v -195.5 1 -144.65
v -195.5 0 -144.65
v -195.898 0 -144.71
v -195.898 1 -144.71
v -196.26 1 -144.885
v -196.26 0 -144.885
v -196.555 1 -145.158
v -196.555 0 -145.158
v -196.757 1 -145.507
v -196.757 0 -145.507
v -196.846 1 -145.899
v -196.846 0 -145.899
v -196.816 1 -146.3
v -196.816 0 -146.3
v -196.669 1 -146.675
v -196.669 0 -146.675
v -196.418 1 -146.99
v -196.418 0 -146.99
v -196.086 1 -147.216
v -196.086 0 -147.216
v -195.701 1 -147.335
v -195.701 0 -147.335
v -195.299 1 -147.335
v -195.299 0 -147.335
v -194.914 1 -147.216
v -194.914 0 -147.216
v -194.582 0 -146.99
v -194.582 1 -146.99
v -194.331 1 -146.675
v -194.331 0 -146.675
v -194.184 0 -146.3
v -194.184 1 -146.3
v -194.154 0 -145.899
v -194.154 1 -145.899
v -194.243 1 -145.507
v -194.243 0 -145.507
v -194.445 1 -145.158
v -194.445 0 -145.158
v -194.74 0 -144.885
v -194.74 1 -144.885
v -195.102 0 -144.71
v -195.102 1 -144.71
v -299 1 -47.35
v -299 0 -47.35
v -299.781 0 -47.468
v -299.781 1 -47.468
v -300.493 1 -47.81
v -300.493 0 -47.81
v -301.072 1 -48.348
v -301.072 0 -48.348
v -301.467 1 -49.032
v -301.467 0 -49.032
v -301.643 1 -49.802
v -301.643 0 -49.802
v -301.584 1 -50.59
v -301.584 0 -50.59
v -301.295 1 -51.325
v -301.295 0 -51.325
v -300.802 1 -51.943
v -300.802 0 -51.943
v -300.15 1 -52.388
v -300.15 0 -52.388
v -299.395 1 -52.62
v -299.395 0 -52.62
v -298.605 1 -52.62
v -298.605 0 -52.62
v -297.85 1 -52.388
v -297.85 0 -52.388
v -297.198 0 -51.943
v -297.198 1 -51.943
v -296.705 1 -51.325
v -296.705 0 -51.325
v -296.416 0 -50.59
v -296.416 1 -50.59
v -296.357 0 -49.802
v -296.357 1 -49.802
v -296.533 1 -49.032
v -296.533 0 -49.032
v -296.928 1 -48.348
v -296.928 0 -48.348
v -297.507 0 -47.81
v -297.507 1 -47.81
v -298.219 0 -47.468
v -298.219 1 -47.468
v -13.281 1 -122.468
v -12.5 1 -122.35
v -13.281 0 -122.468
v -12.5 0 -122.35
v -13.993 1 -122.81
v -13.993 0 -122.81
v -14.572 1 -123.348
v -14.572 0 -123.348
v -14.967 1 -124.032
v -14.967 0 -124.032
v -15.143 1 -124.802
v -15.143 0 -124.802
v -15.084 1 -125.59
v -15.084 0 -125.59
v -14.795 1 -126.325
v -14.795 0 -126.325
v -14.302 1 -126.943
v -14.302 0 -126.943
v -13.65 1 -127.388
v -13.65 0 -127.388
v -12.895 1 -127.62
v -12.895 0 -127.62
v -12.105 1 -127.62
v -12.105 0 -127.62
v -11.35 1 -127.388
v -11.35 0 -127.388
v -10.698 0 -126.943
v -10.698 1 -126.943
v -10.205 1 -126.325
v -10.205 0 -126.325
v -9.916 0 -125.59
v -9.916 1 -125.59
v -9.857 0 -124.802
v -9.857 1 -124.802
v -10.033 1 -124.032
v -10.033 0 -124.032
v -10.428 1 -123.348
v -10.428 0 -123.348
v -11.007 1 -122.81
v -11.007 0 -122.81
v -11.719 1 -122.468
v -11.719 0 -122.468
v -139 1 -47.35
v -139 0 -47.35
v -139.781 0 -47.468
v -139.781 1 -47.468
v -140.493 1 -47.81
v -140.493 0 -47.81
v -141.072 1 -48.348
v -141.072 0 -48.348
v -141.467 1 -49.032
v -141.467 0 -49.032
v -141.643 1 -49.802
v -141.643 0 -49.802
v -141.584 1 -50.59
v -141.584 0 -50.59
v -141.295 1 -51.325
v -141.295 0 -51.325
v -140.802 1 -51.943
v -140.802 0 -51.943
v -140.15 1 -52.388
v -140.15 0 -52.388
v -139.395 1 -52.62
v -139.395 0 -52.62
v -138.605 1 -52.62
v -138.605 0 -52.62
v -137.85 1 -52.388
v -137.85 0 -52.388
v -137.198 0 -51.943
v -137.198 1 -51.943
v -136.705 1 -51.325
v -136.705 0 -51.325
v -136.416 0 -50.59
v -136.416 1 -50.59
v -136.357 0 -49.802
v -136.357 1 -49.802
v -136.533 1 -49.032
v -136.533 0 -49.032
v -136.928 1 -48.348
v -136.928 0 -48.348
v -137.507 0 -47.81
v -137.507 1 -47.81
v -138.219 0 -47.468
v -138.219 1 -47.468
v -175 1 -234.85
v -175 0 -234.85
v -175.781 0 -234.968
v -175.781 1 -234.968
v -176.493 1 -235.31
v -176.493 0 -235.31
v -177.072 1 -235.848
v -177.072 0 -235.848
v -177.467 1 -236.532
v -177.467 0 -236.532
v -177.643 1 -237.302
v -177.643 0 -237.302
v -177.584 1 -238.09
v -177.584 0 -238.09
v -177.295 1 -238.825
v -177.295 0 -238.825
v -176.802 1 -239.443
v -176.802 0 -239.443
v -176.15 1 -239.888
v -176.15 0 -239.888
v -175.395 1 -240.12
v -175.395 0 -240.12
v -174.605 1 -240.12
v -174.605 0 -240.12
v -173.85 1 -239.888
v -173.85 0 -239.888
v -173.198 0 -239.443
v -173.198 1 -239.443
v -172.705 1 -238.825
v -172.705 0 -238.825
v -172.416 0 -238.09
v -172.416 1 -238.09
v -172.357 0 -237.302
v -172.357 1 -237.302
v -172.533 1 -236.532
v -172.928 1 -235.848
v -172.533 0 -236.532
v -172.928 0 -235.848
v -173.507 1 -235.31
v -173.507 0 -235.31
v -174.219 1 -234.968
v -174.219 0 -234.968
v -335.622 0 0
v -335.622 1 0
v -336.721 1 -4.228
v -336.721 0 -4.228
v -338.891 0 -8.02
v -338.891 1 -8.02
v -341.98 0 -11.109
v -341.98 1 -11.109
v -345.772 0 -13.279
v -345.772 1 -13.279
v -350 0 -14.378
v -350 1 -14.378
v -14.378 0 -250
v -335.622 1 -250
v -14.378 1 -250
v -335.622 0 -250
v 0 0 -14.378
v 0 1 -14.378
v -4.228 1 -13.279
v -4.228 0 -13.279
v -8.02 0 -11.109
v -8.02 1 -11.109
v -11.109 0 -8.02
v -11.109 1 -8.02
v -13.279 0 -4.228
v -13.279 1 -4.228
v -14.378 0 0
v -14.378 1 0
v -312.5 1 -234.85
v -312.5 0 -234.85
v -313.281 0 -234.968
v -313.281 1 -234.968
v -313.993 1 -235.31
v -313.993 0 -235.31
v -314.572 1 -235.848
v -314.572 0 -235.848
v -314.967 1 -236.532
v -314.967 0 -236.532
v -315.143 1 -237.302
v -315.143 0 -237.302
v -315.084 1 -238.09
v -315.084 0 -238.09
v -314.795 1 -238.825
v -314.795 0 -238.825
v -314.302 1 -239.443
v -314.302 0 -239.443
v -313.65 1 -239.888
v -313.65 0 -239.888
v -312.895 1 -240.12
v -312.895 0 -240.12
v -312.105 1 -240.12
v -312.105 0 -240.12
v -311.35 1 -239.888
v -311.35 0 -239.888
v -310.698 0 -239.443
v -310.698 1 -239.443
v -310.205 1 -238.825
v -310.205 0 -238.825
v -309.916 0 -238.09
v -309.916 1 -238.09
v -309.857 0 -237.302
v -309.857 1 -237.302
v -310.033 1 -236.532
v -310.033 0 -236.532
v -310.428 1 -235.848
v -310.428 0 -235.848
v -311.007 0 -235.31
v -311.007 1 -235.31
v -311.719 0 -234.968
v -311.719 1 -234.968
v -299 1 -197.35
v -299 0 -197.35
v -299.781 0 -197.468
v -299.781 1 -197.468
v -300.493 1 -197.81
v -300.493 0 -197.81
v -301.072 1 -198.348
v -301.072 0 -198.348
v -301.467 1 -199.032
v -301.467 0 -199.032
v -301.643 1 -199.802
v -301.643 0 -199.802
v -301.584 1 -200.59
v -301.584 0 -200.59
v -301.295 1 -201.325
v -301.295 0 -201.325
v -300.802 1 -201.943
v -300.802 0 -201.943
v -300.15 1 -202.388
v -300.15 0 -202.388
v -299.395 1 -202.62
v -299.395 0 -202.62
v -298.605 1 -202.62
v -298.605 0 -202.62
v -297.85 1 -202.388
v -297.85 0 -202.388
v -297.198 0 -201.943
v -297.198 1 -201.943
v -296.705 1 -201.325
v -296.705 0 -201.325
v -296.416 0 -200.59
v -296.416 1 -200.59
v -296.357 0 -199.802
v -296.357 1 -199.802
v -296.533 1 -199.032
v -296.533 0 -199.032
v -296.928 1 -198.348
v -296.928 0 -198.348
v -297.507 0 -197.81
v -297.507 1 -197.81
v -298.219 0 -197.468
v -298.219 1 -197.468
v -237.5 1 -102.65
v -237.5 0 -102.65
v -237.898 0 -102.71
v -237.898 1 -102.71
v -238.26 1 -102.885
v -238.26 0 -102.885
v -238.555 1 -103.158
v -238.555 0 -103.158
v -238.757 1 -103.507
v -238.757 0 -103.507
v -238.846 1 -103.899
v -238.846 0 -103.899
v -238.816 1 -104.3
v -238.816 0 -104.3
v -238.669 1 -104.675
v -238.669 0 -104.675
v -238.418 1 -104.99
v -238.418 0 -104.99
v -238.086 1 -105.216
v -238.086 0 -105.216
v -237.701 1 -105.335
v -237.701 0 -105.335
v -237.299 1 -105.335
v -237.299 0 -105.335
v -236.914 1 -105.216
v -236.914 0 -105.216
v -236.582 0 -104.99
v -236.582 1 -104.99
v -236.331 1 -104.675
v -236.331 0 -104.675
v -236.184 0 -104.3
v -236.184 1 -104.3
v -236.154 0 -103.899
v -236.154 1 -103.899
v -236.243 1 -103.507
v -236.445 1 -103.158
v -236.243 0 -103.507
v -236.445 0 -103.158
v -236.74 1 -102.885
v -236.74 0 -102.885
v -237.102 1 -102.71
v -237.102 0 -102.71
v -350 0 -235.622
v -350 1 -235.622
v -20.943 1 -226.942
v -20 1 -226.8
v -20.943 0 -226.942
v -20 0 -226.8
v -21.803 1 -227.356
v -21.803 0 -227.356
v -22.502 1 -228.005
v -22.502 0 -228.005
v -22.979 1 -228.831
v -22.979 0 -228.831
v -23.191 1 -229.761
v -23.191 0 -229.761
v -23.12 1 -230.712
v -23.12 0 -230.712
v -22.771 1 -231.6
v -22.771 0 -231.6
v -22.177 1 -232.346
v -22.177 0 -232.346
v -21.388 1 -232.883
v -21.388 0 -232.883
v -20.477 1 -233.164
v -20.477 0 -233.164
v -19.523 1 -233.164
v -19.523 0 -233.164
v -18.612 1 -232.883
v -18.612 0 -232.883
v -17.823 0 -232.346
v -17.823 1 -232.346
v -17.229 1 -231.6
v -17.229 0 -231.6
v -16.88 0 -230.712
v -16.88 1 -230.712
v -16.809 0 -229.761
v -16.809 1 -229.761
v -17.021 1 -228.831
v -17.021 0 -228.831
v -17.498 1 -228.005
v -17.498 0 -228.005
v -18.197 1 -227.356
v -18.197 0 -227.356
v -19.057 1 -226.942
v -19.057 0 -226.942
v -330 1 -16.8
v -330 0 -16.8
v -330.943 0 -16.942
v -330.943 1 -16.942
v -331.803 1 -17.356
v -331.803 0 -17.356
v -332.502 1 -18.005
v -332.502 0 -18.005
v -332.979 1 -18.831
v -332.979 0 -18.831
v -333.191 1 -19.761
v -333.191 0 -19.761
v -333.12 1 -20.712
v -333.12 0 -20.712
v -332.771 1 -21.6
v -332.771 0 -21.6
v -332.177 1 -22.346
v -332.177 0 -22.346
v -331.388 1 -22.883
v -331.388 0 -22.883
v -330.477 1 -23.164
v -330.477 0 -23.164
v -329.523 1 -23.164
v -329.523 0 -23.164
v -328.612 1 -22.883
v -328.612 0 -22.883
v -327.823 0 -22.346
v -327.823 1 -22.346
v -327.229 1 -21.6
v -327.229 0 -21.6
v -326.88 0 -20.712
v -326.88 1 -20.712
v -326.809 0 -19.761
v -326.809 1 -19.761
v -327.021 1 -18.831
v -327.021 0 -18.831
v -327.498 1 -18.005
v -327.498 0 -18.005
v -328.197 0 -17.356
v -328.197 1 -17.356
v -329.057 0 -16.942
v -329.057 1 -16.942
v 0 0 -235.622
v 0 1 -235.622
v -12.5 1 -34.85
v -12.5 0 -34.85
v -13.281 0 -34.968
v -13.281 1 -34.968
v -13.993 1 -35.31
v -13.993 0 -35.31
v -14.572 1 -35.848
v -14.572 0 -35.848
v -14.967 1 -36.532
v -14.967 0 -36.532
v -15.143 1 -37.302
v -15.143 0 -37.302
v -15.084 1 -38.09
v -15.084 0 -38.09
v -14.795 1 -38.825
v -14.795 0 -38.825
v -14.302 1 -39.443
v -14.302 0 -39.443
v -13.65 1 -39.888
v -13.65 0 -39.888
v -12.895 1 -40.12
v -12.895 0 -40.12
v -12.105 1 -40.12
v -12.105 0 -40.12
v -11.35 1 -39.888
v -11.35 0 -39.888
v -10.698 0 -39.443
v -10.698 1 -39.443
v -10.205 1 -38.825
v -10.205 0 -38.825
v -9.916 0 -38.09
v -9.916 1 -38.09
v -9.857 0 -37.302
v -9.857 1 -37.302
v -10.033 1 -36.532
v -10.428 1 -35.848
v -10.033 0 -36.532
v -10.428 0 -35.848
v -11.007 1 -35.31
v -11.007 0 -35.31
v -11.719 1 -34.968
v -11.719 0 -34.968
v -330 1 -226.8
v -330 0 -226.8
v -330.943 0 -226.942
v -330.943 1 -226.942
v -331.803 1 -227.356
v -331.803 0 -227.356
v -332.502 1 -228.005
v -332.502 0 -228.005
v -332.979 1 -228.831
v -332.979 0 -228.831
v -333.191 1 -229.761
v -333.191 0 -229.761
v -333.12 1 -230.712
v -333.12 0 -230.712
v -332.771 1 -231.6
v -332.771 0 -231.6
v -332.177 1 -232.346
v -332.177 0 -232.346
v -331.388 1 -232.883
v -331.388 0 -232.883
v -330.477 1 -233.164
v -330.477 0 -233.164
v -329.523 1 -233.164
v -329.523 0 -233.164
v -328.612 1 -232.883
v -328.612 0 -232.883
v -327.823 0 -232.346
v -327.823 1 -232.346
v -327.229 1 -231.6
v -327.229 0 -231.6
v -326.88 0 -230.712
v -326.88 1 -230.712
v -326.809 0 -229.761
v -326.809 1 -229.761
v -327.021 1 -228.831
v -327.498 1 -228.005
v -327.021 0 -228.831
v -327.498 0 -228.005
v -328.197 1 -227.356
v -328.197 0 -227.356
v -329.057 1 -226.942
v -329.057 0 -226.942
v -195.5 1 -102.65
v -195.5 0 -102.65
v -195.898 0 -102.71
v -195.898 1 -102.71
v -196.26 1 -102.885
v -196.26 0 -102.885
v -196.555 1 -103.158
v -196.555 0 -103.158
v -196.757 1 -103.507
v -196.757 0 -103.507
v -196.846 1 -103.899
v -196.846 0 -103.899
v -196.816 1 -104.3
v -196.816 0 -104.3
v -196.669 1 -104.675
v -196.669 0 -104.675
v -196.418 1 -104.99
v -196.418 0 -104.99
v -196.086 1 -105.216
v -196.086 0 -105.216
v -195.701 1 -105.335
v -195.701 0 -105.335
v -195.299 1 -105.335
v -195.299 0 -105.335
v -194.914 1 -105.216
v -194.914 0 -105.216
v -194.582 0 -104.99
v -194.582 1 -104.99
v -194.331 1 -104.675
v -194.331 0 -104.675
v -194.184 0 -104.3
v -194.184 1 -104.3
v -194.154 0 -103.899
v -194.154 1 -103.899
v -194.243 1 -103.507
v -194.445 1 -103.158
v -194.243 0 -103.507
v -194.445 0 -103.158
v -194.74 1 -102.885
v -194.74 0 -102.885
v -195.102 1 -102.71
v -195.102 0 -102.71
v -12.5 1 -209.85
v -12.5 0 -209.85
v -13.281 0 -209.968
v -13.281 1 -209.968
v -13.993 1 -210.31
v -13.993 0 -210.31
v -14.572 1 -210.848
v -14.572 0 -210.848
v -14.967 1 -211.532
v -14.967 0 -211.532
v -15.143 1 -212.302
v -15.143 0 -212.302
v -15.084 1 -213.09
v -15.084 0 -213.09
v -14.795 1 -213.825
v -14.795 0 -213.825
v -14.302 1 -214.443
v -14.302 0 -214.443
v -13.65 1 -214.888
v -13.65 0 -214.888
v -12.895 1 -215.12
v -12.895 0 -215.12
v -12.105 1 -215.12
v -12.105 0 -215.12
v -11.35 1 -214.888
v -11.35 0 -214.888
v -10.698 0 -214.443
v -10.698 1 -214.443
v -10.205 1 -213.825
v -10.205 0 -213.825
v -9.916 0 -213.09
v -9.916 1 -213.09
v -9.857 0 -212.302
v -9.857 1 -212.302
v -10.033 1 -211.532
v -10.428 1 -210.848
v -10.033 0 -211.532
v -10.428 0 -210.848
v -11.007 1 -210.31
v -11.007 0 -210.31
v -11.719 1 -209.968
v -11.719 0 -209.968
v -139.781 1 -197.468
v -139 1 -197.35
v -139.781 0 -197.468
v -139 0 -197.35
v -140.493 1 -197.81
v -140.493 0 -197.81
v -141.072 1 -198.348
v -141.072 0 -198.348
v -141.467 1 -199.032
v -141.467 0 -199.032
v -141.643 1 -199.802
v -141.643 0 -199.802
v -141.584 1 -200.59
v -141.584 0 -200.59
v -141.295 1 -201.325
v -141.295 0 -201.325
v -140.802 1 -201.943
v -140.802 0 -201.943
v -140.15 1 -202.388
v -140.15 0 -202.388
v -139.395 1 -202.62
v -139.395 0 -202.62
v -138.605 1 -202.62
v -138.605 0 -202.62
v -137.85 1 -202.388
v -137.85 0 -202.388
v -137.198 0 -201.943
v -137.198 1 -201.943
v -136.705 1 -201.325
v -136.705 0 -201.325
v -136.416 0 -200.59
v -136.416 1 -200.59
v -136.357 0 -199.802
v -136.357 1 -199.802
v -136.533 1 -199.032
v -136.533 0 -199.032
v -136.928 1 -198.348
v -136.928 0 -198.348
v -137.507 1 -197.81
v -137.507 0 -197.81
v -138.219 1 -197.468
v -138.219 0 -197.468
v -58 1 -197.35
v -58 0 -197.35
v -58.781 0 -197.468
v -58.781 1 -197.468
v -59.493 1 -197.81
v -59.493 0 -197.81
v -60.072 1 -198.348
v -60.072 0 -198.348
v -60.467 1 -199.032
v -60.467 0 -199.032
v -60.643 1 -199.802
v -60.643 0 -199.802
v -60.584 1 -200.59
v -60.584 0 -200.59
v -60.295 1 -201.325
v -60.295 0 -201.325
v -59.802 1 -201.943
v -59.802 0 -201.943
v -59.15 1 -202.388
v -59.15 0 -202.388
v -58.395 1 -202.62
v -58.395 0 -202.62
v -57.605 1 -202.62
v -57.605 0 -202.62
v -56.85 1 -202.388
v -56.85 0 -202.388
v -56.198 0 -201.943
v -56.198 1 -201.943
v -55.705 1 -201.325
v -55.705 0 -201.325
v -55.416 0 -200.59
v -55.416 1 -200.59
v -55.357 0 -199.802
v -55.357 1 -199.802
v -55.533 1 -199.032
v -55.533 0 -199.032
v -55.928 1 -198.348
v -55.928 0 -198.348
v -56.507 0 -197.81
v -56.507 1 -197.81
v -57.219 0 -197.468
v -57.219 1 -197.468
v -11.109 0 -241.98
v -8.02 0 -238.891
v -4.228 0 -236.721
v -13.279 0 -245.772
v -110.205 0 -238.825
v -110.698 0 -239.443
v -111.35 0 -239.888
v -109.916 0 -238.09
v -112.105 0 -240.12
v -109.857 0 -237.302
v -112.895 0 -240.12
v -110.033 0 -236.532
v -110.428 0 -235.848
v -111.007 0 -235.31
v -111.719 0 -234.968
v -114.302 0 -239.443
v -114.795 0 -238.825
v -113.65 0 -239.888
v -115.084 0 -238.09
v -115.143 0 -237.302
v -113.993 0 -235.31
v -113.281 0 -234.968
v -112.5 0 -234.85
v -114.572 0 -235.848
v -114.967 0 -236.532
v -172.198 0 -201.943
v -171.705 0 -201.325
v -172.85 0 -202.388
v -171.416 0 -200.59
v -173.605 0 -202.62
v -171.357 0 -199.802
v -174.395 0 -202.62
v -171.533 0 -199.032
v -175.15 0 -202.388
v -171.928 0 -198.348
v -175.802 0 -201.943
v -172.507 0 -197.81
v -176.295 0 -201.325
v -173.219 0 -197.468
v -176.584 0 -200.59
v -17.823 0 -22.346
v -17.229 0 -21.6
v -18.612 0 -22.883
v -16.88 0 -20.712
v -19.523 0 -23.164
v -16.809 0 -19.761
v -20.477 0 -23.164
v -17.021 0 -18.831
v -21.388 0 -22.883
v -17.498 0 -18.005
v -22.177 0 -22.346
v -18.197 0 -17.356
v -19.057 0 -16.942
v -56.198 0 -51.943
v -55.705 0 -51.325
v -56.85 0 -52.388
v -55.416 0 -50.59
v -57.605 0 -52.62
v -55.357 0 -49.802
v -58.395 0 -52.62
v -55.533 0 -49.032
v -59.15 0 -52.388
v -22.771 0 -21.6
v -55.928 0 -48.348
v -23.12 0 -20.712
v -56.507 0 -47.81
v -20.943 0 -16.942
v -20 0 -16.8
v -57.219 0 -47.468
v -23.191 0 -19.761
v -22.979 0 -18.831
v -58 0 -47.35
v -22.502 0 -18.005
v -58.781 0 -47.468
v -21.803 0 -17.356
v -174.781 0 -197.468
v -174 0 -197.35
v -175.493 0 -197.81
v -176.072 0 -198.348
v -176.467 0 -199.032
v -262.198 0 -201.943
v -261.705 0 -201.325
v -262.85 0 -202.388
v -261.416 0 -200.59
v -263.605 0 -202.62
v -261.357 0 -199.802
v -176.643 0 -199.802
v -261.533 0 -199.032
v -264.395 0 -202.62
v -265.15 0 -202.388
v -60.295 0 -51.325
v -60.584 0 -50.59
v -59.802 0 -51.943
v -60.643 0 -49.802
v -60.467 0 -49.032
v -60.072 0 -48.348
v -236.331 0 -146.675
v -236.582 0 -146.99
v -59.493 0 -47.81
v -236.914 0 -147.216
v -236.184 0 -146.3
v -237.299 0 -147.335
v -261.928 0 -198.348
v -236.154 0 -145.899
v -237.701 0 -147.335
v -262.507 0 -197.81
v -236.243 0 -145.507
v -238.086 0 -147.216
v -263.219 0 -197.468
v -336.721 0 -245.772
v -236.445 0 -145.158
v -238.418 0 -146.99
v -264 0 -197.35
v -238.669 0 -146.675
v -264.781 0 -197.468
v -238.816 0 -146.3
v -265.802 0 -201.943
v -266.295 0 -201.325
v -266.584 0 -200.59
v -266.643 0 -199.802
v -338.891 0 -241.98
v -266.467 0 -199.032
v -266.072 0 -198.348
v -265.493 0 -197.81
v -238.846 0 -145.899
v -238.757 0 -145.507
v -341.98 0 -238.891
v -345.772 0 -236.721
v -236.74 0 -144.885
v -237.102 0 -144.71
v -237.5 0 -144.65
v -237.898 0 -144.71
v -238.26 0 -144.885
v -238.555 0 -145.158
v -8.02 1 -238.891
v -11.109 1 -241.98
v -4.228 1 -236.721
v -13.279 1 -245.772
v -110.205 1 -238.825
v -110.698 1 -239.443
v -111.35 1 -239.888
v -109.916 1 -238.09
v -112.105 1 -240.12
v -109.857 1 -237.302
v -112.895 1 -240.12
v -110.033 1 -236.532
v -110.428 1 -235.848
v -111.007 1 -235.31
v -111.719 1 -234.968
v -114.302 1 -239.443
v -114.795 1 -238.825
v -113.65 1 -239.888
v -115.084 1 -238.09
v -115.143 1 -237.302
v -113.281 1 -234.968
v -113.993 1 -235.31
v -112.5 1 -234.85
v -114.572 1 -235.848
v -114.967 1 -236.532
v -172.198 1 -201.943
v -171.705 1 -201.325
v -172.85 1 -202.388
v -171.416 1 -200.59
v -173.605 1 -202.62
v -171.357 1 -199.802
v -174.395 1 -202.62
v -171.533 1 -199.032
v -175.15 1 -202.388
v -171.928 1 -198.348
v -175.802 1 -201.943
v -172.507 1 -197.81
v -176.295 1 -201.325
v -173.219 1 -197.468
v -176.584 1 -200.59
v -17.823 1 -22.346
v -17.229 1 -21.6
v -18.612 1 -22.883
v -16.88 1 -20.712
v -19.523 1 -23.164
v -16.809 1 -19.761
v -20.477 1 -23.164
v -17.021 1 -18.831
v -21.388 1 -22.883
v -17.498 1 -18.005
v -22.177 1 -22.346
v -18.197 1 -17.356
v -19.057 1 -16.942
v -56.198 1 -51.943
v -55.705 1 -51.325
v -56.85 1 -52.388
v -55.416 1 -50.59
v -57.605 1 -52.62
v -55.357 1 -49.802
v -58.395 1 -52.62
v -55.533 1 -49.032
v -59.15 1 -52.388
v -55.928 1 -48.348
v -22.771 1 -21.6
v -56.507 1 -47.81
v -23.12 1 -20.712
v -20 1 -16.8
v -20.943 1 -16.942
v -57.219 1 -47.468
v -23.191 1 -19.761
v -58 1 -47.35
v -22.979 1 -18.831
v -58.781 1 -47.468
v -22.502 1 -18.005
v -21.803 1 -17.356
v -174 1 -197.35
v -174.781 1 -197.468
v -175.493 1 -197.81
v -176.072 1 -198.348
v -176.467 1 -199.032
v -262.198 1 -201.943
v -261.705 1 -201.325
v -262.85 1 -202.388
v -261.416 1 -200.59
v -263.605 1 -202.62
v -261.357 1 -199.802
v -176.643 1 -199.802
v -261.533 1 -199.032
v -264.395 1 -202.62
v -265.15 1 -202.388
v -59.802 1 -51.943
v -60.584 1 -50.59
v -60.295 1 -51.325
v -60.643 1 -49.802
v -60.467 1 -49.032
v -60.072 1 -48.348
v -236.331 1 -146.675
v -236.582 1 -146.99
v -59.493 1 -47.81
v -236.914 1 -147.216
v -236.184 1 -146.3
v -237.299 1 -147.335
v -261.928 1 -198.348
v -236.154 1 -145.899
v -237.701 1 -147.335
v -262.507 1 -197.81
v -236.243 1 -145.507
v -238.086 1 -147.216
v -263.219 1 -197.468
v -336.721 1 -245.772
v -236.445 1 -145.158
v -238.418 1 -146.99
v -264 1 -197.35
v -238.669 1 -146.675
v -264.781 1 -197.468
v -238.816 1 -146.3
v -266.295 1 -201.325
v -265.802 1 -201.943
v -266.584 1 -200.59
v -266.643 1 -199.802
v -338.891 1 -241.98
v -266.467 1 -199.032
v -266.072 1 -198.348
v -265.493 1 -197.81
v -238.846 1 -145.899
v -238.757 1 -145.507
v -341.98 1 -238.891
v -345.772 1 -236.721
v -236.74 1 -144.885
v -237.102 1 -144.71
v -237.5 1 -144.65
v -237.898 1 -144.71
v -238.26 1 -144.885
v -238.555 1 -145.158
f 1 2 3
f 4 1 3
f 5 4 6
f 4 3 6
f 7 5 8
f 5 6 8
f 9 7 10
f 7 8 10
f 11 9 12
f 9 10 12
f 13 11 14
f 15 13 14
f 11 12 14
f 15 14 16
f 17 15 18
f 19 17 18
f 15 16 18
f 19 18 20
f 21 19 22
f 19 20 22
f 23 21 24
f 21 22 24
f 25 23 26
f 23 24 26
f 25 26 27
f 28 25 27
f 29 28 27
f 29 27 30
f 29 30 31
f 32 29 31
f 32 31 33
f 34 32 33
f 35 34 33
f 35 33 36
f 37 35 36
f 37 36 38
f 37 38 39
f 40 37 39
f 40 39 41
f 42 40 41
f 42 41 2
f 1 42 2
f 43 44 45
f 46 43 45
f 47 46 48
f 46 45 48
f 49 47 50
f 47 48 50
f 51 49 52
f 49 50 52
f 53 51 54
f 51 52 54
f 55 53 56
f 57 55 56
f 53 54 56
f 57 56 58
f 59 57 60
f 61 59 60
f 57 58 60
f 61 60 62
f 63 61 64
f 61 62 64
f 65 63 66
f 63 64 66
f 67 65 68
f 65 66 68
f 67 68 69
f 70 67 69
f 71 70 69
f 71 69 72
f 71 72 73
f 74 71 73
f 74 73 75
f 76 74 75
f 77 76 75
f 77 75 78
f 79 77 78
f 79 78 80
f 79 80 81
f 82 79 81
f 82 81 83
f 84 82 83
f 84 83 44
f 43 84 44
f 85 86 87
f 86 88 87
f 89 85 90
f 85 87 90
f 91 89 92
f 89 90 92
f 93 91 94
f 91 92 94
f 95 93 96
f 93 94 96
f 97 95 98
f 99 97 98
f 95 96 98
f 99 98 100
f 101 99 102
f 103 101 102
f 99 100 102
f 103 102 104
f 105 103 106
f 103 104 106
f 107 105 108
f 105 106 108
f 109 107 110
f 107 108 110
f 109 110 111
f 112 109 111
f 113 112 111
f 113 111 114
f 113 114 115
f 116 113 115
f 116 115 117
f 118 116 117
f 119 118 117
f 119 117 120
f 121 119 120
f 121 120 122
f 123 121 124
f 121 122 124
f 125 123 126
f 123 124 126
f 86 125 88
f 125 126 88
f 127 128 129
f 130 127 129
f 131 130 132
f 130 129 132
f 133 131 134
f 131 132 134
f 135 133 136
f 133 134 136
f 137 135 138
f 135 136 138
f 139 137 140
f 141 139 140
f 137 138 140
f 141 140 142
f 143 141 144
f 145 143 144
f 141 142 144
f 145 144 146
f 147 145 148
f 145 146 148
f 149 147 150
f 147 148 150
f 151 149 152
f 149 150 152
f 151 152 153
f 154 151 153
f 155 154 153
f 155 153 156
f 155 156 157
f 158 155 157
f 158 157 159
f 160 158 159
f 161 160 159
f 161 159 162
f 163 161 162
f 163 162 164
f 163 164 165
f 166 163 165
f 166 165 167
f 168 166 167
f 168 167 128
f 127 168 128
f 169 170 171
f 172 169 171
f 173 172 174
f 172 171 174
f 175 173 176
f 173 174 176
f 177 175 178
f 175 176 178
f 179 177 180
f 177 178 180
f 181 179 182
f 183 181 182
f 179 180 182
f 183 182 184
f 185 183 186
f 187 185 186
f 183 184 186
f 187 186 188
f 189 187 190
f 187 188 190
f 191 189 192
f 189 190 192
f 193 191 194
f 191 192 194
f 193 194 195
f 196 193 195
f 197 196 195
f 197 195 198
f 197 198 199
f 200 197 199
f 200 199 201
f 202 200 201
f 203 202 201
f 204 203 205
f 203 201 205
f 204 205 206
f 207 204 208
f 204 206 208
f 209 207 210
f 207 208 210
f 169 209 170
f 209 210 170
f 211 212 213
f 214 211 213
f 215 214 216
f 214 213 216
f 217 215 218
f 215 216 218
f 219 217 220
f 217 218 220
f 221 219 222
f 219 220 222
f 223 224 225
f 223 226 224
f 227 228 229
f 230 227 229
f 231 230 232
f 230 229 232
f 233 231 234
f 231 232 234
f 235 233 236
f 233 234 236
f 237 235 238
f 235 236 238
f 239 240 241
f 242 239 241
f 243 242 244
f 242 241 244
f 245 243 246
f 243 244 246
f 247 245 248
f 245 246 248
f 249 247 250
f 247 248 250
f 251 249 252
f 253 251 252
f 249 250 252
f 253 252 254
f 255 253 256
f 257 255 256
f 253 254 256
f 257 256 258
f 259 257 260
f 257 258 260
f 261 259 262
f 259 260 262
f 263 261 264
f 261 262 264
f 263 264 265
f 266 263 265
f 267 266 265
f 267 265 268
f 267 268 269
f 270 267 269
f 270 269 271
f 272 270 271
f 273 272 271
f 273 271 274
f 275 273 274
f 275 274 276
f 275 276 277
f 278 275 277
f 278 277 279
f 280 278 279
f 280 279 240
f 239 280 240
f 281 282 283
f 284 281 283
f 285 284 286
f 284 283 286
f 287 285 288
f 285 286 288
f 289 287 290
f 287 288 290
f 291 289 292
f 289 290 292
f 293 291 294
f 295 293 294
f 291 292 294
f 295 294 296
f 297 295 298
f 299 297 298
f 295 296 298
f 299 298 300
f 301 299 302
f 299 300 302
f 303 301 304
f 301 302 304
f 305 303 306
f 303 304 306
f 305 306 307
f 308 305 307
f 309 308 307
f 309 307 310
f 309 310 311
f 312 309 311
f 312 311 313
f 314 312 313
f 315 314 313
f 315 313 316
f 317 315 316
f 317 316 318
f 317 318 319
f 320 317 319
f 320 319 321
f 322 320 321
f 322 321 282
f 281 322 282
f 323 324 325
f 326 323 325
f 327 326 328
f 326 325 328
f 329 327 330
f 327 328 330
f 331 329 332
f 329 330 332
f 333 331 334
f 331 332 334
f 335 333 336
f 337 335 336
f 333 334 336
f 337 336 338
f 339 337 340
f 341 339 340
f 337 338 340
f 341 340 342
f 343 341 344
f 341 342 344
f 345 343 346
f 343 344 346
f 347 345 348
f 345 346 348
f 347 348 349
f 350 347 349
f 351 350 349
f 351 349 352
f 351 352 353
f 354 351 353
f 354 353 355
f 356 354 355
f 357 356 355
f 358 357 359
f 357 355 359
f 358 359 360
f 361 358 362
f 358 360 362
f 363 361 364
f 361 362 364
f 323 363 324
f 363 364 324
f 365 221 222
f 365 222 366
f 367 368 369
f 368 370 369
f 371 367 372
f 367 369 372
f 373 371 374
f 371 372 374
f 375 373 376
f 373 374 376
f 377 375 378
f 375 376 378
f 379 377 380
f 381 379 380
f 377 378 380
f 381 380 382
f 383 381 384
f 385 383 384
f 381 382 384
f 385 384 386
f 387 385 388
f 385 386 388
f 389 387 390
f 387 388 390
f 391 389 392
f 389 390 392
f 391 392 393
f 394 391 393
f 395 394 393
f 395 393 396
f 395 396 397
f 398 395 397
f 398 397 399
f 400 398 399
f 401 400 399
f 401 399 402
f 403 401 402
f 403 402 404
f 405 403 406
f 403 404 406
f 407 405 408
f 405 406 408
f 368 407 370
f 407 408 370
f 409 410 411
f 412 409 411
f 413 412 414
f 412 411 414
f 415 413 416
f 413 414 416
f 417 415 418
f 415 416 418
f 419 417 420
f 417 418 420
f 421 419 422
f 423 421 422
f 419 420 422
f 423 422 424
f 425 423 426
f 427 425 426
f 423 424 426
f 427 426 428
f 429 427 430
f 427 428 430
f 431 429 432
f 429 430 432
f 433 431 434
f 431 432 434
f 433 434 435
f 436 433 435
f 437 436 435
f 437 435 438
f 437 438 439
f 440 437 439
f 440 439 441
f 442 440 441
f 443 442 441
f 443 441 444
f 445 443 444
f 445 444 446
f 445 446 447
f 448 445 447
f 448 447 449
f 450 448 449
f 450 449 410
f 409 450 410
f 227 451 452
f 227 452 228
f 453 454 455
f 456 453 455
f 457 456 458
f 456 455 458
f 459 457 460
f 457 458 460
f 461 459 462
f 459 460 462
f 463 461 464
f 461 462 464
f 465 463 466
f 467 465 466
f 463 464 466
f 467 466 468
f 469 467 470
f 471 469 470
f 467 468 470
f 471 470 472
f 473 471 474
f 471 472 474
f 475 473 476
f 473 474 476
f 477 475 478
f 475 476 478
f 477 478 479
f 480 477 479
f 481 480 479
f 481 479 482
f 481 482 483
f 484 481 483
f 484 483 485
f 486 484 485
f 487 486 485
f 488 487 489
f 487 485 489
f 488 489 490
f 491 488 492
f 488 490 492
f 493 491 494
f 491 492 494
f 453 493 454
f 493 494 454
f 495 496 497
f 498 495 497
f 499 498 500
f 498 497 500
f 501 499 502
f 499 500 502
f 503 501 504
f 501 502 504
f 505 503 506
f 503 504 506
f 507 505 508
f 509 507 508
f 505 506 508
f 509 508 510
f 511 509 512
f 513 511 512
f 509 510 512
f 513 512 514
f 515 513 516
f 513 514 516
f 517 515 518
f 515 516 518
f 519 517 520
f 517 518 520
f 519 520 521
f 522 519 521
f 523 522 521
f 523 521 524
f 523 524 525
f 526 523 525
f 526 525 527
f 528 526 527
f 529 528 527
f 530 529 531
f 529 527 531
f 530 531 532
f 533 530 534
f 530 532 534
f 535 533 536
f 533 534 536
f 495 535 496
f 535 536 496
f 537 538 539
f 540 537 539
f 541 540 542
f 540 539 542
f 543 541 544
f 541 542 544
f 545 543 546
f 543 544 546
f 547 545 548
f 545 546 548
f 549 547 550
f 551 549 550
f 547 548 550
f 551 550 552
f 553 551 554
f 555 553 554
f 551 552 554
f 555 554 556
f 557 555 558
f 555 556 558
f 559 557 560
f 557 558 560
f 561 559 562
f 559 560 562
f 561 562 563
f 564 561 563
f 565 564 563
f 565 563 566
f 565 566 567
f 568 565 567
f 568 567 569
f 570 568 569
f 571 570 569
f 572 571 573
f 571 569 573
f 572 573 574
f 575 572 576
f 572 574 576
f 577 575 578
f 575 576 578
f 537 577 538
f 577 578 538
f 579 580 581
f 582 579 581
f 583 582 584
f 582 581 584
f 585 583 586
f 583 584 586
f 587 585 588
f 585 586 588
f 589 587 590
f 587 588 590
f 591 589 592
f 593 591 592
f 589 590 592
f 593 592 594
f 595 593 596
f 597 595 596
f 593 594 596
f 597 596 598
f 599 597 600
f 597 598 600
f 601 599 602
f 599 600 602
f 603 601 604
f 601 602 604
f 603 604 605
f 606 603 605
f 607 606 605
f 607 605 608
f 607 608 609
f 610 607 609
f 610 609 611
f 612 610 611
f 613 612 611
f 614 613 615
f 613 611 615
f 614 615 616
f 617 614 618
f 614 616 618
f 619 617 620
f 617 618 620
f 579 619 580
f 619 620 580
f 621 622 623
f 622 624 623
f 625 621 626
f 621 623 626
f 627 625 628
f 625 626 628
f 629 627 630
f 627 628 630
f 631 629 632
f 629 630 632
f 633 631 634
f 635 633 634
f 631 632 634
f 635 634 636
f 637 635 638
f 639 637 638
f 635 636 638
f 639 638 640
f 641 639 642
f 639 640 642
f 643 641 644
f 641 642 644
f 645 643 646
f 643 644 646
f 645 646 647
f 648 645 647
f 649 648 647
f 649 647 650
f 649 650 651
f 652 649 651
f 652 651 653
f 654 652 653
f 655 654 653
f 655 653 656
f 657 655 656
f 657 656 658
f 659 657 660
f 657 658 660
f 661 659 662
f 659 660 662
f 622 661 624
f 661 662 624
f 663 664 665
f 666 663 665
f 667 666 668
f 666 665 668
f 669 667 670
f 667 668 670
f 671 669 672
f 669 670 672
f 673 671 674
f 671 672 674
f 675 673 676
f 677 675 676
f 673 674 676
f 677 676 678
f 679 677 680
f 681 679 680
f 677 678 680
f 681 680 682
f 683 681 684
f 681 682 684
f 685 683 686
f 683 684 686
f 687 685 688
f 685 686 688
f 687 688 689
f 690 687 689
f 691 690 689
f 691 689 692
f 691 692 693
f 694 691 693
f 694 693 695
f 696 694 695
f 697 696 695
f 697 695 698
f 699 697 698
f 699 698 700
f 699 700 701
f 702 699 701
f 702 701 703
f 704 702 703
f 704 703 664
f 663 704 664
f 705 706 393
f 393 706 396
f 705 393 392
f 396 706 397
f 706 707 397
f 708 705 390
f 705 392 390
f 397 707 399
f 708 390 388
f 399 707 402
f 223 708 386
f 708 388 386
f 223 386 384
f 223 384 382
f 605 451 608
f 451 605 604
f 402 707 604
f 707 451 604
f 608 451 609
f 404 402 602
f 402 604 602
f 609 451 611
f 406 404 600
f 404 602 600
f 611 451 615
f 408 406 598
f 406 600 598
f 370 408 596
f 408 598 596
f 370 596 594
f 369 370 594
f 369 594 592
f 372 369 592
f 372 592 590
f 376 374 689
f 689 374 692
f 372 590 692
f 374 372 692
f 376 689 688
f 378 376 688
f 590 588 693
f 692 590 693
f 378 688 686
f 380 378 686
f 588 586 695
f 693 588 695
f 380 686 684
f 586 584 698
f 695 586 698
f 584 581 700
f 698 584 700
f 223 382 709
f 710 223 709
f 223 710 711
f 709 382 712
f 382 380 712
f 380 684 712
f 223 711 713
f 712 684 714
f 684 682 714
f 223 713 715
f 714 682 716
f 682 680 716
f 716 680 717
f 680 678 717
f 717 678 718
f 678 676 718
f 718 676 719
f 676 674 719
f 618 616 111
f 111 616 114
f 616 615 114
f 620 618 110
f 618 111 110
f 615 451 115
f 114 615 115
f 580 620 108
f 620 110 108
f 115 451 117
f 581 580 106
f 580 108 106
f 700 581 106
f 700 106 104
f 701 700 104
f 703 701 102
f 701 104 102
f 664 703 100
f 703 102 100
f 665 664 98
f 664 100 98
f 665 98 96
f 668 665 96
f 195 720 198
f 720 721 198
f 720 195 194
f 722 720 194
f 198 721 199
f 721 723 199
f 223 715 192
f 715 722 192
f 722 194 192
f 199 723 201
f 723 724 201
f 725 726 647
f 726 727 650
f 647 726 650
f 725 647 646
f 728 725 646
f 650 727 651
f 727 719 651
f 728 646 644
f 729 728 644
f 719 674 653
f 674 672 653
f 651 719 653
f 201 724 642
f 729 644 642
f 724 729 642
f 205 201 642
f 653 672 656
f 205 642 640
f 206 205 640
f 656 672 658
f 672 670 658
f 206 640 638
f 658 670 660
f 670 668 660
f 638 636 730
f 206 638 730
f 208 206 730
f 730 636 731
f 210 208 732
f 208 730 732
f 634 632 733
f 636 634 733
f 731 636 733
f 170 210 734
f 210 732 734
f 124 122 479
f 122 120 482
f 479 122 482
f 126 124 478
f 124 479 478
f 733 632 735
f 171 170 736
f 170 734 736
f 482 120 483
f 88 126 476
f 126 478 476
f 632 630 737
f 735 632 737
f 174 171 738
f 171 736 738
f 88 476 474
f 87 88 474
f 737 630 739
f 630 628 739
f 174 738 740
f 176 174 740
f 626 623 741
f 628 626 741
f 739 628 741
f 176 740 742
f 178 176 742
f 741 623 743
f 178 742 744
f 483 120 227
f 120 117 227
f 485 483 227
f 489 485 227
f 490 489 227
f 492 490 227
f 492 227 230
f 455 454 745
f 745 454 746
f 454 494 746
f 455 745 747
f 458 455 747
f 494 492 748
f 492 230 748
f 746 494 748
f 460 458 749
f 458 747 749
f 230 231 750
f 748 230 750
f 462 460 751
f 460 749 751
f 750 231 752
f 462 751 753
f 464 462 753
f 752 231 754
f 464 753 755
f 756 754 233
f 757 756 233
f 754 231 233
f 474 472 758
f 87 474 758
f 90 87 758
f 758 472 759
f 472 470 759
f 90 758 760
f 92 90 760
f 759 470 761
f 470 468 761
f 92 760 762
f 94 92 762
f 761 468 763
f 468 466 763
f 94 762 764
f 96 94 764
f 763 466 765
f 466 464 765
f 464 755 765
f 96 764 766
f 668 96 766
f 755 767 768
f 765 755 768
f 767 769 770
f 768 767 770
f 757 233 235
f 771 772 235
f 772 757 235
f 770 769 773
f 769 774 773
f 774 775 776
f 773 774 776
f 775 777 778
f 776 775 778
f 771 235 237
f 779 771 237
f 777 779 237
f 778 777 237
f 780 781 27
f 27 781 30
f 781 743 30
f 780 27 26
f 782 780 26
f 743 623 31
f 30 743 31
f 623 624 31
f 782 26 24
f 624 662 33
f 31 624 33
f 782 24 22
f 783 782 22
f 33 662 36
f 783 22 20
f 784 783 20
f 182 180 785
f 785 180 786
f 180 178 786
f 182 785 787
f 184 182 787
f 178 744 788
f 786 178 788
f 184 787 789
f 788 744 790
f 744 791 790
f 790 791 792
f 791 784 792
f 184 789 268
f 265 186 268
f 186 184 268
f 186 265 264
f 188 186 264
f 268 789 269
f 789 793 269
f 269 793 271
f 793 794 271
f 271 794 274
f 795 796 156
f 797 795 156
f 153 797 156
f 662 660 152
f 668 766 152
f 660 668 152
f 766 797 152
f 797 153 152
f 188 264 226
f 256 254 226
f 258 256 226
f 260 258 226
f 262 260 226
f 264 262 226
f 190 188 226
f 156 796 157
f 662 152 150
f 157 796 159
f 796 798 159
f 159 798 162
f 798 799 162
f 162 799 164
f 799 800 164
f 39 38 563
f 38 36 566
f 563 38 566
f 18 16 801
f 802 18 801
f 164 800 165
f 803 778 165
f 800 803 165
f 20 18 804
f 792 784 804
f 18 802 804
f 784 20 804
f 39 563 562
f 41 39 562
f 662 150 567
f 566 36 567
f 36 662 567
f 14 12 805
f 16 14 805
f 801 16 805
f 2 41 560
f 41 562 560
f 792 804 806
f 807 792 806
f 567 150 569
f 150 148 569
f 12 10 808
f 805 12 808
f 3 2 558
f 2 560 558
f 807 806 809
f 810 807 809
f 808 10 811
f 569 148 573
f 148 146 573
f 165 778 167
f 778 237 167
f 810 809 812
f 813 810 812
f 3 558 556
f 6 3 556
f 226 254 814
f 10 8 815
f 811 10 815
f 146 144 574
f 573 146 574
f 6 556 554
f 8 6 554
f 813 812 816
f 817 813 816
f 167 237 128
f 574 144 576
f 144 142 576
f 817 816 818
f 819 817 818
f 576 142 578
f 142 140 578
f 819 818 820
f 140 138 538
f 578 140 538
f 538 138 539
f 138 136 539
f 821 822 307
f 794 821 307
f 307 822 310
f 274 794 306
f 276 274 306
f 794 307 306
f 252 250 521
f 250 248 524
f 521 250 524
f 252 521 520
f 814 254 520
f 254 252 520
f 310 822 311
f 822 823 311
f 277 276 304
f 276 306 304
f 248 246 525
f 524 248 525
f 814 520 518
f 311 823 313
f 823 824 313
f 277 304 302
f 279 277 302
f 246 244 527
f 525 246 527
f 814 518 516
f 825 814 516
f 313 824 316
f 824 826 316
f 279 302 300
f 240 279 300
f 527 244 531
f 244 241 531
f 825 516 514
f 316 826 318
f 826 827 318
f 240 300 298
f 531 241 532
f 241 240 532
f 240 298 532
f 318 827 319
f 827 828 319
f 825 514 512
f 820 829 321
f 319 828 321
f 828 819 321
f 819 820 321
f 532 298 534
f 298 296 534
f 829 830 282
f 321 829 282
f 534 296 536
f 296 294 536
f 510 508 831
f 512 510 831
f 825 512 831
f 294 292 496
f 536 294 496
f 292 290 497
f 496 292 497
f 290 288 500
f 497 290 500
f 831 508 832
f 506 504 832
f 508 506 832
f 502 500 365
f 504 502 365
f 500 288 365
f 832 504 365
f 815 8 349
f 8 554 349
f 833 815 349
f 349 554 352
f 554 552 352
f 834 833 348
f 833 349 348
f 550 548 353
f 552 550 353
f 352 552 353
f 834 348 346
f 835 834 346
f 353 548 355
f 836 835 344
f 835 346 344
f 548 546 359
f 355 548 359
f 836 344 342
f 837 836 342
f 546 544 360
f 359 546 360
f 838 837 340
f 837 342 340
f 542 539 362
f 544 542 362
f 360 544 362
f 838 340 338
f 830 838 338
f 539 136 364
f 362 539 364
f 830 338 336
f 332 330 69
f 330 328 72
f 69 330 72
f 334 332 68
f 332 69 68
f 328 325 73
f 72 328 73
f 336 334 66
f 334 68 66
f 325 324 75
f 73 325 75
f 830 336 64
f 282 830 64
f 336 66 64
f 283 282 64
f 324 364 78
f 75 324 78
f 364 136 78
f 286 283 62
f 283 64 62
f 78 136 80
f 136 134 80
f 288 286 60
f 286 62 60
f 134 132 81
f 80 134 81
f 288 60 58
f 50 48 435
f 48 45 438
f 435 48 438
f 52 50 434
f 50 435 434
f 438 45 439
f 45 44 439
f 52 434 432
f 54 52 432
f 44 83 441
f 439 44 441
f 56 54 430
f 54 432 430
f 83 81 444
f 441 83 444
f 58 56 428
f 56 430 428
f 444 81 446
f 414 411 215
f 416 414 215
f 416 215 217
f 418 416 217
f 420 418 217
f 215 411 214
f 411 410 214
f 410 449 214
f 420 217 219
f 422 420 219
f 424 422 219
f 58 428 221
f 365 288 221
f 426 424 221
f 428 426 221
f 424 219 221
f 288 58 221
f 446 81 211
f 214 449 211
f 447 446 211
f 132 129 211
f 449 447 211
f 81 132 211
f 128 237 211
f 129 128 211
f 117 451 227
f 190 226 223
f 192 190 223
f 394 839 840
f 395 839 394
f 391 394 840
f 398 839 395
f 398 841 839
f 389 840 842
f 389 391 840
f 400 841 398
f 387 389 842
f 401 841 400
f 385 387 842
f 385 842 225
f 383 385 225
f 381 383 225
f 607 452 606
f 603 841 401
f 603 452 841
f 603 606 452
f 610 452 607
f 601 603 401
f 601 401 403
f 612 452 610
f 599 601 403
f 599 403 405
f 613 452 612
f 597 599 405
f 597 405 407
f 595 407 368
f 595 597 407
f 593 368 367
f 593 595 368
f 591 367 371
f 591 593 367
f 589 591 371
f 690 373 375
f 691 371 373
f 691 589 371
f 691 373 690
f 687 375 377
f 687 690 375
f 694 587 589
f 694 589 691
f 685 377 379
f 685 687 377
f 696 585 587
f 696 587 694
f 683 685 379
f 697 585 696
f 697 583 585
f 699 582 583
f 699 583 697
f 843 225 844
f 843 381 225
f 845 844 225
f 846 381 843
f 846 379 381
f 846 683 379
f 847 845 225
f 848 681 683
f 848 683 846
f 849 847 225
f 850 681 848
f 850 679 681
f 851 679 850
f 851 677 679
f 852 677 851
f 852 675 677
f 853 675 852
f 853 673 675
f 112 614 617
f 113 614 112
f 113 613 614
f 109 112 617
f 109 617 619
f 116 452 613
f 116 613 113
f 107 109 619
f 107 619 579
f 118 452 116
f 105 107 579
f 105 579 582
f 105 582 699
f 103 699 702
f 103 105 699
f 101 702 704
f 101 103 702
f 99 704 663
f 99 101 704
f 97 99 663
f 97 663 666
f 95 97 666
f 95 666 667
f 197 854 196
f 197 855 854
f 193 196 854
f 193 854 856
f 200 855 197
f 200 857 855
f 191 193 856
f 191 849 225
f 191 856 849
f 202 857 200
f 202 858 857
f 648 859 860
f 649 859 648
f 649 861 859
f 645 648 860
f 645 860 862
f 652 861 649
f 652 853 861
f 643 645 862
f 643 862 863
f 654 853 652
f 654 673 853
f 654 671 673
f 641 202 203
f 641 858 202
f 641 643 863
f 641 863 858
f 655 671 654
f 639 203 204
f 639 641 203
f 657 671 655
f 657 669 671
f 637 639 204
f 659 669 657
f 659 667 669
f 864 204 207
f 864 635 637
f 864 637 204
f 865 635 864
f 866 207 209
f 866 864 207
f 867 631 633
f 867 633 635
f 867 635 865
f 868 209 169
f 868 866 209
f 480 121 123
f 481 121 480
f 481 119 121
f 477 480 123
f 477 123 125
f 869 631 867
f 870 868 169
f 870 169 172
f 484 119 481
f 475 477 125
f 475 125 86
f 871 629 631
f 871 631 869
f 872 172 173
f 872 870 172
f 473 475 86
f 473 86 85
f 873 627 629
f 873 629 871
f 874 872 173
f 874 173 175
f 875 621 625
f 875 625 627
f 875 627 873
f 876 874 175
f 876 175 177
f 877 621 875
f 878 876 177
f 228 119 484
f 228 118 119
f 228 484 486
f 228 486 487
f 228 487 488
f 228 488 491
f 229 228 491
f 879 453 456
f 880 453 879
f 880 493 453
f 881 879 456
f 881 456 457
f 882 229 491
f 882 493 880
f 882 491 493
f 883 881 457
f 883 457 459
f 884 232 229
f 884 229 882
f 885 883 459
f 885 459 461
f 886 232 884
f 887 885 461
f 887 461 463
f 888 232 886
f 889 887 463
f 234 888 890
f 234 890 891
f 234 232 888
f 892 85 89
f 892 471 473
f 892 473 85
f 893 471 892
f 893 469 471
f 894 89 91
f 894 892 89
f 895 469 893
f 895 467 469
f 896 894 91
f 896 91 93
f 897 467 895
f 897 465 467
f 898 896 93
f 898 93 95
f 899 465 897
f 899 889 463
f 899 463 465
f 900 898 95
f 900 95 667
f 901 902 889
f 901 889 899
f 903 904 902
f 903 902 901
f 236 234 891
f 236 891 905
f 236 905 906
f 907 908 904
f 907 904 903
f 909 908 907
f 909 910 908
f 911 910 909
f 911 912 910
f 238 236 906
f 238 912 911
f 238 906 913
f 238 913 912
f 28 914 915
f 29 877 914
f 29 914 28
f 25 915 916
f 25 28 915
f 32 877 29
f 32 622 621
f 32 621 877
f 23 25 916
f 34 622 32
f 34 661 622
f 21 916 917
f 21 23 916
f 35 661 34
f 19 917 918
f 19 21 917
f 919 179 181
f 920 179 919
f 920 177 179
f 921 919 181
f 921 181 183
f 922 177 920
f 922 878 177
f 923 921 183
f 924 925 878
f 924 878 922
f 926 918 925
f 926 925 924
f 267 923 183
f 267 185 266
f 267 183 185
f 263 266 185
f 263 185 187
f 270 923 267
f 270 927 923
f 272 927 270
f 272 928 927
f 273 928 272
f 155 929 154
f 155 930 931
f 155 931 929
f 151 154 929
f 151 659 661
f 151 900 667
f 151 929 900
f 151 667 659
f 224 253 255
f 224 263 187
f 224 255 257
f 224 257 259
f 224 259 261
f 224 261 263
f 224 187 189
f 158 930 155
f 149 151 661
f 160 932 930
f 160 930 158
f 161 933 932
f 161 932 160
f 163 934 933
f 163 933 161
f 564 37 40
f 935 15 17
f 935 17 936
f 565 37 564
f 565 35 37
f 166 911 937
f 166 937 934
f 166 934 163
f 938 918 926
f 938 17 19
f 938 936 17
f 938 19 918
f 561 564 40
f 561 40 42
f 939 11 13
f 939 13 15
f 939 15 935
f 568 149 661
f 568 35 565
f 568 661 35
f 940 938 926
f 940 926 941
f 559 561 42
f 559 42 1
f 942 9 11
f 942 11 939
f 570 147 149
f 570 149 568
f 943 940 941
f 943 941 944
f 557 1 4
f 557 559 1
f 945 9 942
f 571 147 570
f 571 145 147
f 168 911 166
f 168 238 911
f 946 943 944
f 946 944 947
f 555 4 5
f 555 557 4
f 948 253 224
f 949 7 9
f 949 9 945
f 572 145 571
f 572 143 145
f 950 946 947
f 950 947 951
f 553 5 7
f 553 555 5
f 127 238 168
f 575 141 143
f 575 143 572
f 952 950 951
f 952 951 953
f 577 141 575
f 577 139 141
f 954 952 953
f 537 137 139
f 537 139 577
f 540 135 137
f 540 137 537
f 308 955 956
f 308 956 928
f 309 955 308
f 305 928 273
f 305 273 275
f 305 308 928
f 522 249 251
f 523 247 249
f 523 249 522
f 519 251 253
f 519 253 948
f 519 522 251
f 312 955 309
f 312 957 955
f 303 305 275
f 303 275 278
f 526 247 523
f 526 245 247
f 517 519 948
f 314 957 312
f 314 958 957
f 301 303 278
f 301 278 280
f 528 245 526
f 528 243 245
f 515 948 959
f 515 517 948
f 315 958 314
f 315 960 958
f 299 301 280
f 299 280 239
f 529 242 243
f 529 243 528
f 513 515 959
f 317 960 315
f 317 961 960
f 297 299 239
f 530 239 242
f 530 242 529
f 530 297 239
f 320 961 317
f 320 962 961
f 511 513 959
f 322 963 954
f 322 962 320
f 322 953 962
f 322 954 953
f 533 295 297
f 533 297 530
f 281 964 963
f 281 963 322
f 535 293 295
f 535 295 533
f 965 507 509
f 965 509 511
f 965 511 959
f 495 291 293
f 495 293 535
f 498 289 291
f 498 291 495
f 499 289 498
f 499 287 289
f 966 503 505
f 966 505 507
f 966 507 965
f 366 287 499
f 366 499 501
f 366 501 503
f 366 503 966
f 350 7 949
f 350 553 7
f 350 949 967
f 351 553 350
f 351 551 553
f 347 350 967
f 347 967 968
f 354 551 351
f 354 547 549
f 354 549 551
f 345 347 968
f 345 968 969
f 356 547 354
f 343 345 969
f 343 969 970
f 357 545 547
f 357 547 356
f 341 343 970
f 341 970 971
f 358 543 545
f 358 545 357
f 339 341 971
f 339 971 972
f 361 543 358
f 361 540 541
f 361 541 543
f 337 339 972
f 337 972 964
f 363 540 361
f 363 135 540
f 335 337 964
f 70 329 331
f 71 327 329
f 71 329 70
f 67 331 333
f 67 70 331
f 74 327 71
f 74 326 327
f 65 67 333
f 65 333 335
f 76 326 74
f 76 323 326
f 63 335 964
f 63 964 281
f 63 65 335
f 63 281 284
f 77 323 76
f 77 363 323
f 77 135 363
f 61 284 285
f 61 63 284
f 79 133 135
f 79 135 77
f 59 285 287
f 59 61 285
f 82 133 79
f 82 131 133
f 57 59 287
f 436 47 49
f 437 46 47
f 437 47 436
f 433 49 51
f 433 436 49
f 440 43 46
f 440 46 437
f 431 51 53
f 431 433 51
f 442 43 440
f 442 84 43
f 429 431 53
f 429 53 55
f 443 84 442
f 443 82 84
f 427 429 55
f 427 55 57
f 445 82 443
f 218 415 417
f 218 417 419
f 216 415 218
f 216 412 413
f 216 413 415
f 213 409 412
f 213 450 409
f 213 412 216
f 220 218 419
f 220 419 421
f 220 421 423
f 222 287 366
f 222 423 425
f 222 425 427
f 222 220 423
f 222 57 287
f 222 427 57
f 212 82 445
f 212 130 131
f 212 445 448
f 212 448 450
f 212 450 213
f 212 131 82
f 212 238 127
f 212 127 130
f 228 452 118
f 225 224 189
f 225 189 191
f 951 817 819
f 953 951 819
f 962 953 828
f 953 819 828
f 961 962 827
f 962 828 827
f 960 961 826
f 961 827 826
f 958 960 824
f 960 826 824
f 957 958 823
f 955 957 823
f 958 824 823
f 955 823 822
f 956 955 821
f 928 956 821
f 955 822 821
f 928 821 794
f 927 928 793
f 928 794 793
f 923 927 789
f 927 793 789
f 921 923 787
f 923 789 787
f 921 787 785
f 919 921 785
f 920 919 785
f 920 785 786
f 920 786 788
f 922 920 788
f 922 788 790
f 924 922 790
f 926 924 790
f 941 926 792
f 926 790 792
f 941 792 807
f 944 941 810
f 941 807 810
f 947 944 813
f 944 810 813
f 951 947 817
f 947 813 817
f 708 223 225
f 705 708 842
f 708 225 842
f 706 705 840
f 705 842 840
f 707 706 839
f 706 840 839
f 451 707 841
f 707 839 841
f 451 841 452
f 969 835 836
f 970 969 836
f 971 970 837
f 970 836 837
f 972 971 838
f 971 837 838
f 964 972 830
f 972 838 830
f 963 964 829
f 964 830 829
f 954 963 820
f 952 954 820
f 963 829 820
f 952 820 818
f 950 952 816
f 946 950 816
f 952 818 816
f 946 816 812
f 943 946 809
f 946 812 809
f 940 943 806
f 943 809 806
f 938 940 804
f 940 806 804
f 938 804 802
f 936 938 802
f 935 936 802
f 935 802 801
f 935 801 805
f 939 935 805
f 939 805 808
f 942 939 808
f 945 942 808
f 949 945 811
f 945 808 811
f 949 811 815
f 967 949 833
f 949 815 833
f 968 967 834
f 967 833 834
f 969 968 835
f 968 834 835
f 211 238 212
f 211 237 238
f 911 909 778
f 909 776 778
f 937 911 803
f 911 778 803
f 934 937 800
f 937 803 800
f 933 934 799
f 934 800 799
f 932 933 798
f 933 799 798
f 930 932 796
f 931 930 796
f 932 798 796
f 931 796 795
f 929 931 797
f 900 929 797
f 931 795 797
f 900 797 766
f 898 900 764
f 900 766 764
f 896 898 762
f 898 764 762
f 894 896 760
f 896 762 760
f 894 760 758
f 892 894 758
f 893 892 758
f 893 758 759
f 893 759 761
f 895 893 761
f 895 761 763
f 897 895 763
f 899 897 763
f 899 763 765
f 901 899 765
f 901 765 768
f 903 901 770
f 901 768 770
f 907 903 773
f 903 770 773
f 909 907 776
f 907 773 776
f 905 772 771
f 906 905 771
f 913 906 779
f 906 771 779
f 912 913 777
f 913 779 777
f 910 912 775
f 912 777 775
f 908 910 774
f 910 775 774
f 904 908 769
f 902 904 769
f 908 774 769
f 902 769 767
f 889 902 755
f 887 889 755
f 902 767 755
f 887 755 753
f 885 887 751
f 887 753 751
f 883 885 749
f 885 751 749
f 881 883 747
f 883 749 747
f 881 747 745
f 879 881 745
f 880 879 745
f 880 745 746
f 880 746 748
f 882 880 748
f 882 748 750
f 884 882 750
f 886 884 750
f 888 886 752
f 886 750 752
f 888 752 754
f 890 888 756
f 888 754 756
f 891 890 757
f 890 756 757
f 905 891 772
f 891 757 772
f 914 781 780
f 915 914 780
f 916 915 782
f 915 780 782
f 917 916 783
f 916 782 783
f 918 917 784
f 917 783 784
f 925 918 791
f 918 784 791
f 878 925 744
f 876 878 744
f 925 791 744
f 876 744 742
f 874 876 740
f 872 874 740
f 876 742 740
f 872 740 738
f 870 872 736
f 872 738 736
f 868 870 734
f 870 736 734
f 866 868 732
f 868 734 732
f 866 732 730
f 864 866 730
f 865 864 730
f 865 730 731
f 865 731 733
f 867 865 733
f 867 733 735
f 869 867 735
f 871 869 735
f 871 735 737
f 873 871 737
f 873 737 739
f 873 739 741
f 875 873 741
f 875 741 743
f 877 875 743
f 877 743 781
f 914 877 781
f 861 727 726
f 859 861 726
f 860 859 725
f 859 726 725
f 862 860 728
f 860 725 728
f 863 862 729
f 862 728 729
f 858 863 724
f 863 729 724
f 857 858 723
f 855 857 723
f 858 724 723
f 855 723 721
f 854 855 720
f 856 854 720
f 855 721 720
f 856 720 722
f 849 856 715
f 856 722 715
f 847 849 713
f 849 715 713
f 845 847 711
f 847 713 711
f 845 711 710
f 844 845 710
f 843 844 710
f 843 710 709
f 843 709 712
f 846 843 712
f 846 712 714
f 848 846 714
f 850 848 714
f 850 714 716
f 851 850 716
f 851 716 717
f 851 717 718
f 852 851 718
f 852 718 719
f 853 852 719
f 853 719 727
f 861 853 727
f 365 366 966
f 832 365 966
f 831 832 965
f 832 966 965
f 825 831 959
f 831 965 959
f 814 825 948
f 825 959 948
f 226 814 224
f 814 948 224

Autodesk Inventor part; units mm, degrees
ref_plane "YZ Plane" through (0, 0, 0) normal (1, 0, 0) x (0, 1, 0)
ref_plane "XZ Plane" through (0, 0, 0) normal (0, 1, 0) x (-1, 0, 0)
ref_plane "XY Plane" through (0, 0, 0) normal (0, 0, 1) x (1, 0, 0)
sketch "Sketch1" plane through (0, 0, 0) normal (0, 1, 0) x (-1, 0, 0)
  line L0 (0, 0) -> (350, 0)
  line L1 (350, 0) -> (350, -250)
  line L2 (350, -250) -> (0, -250)
  line L3 (0, -250) -> (0, 0)
  dimension "d0" = 250
  dimension "d1" = 350
extrude "Extrusion1" add sketch "Sketch1" along normal blind 1
sketch "Sketch2" plane through (0, 1, 0) normal (0, 1, 0) x (1, 0, 0)
  line L0 (-350, 0) -> (0, 0) projected
  line L1 (0, 0) -> (0, 250) projected
  line L2 (0, 250) -> (-350, 250) projected
  line L3 (-350, 250) -> (-350, 0) projected
  circle A0 centre (2, -2) radius 16.5
  circle A1 centre (-352, -2) radius 16.5
  circle A2 centre (-352, 252) radius 16.5
  circle A3 centre (2, 252) radius 16.5
  dimension "d9" = 2
  dimension "d10" = 2
  dimension "d11" = 33
  dimension "d12" = 2
  dimension "d13" = 2
  dimension "d14" = 33
  dimension "d15" = 2
  dimension "d16" = 2
  dimension "d17" = 33
  dimension "d18" = 2
  dimension "d19" = 2
  dimension "d20" = 33
extrude "Extrusion2" cut sketch "Sketch2" against normal blind 1 contours L3 A1 L0 | L0 A1 L3 | A0 L1 L0 | L0 L1 A0 | A2 L2 L3 | L3 L2 A2 | A3 L2 L1 | L1 L2 A3
sketch "Sketch3" plane through (0, 1, 0) normal (0, 1, 0) x (1, 0, 0)
  line L0 (-335.6217, 0) -> (-14.3783, 0) projected
  line L1 (0, 14.3783) -> (0, 235.6217) projected
  line L2 (-14.3783, 250) -> (-335.6217, 250) projected
  line L3 (-350, 235.6217) -> (-350, 14.3783) projected
  point P0 (0, 0)
  point P1 (-20, 20)
  point P2 (-20, 230)
  point P3 (-330, 230)
  point P4 (-330, 20)
  dimension "d23" = 20
  dimension "d24" = 20
  dimension "d25" = 20
  dimension "d26" = 20
  dimension "d27" = 20
  dimension "d28" = 20
  dimension "d29" = 20
  dimension "d30" = 20
hole "Hole1" at (-20, 1, -20) at (-20, 1, -230) at (-330, 1, -230) at (-330, 1, -20) direction (0, -1, 0) diameter 6.4 end through all
sketch "Sketch5" plane through (0, 1, 0) normal (0, 1, 0) x (1, 0, 0)
  line L0 (0, 14.3783) -> (0, 235.6217) projected
  line L1 (-14.3783, 250) -> (-335.6217, 250) projected
  line L2 (-335.6217, 0) -> (-14.3783, 0) projected
  line L3 (-350, 235.6217) -> (-350, 14.3783) projected
  point P0 (0, 0)
  point P1 (-12.5, 37.5)
  point P2 (-12.5, 125)
  point P3 (-12.5, 212.5)
  point P4 (-112.5, 237.5)
  point P5 (-175, 237.5)
  point P6 (-312.5, 237.5)
  dimension "d38" = 12.5
  dimension "d39" = 12.5
  dimension "d40" = 12.5
  dimension "d41" = 37.5
  dimension "d42" = 37.5
  dimension "d43" = 125
  dimension "d44" = 112.5
  dimension "d45" = 175
  dimension "d46" = 37.5
  dimension "d47" = 12.5
  dimension "d48" = 12.5
  dimension "d49" = 12.5
hole "Hole2" at (-12.5, 1, -37.5) at (-12.5, 1, -125) at (-12.5, 1, -212.5) at (-112.5, 1, -237.5) at (-175, 1, -237.5) at (-312.5, 1, -237.5) direction (0, -1, 0) diameter 5.3 end through all
sketch "Sketch6" plane through (0, 1, 0) normal (0, 1, 0) x (1, 0, 0)
  line L0 (0, 14.3783) -> (0, 235.6217) projected
  line L1 (-335.6217, 0) -> (-14.3783, 0) projected
  line L2 (-14.3783, 250) -> (-335.6217, 250) projected
  point P0 (0, 0)
  point P1 (-58, 50)
  point P2 (-58, 200)
  dimension "d57" = 58
  dimension "d58" = 50
  dimension "d59" = 50
  dimension "d60" = 58
hole "Hole3" at (-58, 1, -50) at (-58, 1, -200) direction (0, -1, 0) diameter 5.3 end through all
sketch "Sketch7" plane through (0, 1, 0) normal (0, 1, 0) x (1, 0, 0)
  line L0 (0, 14.3783) -> (0, 235.6217) projected
  line L1 (-335.6217, 0) -> (-14.3783, 0) projected
  line L2 (-14.3783, 250) -> (-335.6217, 250) projected
  point P0 (0, 0)
  point P1 (-139, 50)
  point P2 (-139, 200)
  point P3 (-174, 200)
  point P4 (-264, 200)
  point P5 (-299, 50)
  point P6 (-299, 200)
  dimension "d68" = 139
  dimension "d69" = 139
  dimension "d70" = 50
  dimension "d71" = 50
  dimension "d79" = 50
  dimension "d80" = 50
  dimension "d81" = 50
  dimension "d82" = 50
  dimension "d83" = 90
  dimension "d84" = 35
  dimension "d85" = 160
  dimension "d86" = 160
hole "Hole4" at (-139, 1, -50) at (-139, 1, -200) at (-174, 1, -200) at (-264, 1, -200) at (-299, 1, -50) at (-299, 1, -200) direction (0, -1, 0) diameter 5.3 end through all
sketch "Sketch8" plane through (0, 1, 0) normal (0, 1, 0) x (1, 0, 0)
  line L0 (0, 14.3783) -> (0, 235.6217) projected
  line L1 (-335.6217, 0) -> (-14.3783, 0) projected
  point P0 (0, 0)
  point P1 (-237.5, 104)
  point P2 (-237.5, 146)
  point P3 (-195.5, 104)
  point P4 (-195.5, 146)
  dimension "d87" = 42
  dimension "d88" = 42
  dimension "d89" = 42
  dimension "d90" = 195.5
  dimension "d91" = 195.5
  dimension "d92" = 42
  dimension "d93" = 104
  dimension "d94" = 104
hole "Hole5" at (-237.5, 1, -104) at (-237.5, 1, -146) at (-195.5, 1, -104) at (-195.5, 1, -146) direction (0, -1, 0) diameter 2.7 end through all
equation "\"d14\" = d11"
equation "\"d17\" = d11"
equation "\"d20\" = d11"
equation "\"d25\" = d24"
equation "\"d26\" = d23"
equation "\"d27\" = d23"
equation "\"d28\" = d24"
equation "\"d29\" = d24"
equation "\"d30\" = d23"
equation "\"d36\" = Thickness"
equation "\"d39\" = d38"
equation "\"d40\" = d38"
equation "\"d42\" = d41"
equation "\"d48\" = d47"
equation "\"d49\" = d47"
equation "\"d55\" = Thickness"
equation "\"d59\" = d58"
equation "\"d60\" = d57"
equation "\"d66\" = Thickness"
equation "\"d69\" = d68"
equation "\"d71\" = d70"
equation "\"d80\" = d79"
equation "\"d81\" = d70"
equation "\"d82\" = d70"
equation "\"d86\" = d85"
equation "\"d77\" = Thickness"
equation "\"d88\" = d87"
equation "\"d91\" = d90"
equation "\"d92\" = d89"
equation "\"d94\" = d93"
equation "\"d100\" = Thickness"
equation "\"BendRadius\" = Thickness"
equation "\"BendReliefWidth\" = Thickness"
equation "\"BendReliefDepth\" = 0.5 * Thickness"
equation "\"CornerReliefSize\" = 4 * Thickness"
equation "\"MinimumRemnant\" = 2 * Thickness"
equation "\"TransitionRadius\" = BendRadius"
equation "\"JacobiRadiusSize\" = BendRadius"
equation "\"GapSize\" = Thickness"
equation "\"Thickness\" = 0.5"
properties part number "MetalSheet"
